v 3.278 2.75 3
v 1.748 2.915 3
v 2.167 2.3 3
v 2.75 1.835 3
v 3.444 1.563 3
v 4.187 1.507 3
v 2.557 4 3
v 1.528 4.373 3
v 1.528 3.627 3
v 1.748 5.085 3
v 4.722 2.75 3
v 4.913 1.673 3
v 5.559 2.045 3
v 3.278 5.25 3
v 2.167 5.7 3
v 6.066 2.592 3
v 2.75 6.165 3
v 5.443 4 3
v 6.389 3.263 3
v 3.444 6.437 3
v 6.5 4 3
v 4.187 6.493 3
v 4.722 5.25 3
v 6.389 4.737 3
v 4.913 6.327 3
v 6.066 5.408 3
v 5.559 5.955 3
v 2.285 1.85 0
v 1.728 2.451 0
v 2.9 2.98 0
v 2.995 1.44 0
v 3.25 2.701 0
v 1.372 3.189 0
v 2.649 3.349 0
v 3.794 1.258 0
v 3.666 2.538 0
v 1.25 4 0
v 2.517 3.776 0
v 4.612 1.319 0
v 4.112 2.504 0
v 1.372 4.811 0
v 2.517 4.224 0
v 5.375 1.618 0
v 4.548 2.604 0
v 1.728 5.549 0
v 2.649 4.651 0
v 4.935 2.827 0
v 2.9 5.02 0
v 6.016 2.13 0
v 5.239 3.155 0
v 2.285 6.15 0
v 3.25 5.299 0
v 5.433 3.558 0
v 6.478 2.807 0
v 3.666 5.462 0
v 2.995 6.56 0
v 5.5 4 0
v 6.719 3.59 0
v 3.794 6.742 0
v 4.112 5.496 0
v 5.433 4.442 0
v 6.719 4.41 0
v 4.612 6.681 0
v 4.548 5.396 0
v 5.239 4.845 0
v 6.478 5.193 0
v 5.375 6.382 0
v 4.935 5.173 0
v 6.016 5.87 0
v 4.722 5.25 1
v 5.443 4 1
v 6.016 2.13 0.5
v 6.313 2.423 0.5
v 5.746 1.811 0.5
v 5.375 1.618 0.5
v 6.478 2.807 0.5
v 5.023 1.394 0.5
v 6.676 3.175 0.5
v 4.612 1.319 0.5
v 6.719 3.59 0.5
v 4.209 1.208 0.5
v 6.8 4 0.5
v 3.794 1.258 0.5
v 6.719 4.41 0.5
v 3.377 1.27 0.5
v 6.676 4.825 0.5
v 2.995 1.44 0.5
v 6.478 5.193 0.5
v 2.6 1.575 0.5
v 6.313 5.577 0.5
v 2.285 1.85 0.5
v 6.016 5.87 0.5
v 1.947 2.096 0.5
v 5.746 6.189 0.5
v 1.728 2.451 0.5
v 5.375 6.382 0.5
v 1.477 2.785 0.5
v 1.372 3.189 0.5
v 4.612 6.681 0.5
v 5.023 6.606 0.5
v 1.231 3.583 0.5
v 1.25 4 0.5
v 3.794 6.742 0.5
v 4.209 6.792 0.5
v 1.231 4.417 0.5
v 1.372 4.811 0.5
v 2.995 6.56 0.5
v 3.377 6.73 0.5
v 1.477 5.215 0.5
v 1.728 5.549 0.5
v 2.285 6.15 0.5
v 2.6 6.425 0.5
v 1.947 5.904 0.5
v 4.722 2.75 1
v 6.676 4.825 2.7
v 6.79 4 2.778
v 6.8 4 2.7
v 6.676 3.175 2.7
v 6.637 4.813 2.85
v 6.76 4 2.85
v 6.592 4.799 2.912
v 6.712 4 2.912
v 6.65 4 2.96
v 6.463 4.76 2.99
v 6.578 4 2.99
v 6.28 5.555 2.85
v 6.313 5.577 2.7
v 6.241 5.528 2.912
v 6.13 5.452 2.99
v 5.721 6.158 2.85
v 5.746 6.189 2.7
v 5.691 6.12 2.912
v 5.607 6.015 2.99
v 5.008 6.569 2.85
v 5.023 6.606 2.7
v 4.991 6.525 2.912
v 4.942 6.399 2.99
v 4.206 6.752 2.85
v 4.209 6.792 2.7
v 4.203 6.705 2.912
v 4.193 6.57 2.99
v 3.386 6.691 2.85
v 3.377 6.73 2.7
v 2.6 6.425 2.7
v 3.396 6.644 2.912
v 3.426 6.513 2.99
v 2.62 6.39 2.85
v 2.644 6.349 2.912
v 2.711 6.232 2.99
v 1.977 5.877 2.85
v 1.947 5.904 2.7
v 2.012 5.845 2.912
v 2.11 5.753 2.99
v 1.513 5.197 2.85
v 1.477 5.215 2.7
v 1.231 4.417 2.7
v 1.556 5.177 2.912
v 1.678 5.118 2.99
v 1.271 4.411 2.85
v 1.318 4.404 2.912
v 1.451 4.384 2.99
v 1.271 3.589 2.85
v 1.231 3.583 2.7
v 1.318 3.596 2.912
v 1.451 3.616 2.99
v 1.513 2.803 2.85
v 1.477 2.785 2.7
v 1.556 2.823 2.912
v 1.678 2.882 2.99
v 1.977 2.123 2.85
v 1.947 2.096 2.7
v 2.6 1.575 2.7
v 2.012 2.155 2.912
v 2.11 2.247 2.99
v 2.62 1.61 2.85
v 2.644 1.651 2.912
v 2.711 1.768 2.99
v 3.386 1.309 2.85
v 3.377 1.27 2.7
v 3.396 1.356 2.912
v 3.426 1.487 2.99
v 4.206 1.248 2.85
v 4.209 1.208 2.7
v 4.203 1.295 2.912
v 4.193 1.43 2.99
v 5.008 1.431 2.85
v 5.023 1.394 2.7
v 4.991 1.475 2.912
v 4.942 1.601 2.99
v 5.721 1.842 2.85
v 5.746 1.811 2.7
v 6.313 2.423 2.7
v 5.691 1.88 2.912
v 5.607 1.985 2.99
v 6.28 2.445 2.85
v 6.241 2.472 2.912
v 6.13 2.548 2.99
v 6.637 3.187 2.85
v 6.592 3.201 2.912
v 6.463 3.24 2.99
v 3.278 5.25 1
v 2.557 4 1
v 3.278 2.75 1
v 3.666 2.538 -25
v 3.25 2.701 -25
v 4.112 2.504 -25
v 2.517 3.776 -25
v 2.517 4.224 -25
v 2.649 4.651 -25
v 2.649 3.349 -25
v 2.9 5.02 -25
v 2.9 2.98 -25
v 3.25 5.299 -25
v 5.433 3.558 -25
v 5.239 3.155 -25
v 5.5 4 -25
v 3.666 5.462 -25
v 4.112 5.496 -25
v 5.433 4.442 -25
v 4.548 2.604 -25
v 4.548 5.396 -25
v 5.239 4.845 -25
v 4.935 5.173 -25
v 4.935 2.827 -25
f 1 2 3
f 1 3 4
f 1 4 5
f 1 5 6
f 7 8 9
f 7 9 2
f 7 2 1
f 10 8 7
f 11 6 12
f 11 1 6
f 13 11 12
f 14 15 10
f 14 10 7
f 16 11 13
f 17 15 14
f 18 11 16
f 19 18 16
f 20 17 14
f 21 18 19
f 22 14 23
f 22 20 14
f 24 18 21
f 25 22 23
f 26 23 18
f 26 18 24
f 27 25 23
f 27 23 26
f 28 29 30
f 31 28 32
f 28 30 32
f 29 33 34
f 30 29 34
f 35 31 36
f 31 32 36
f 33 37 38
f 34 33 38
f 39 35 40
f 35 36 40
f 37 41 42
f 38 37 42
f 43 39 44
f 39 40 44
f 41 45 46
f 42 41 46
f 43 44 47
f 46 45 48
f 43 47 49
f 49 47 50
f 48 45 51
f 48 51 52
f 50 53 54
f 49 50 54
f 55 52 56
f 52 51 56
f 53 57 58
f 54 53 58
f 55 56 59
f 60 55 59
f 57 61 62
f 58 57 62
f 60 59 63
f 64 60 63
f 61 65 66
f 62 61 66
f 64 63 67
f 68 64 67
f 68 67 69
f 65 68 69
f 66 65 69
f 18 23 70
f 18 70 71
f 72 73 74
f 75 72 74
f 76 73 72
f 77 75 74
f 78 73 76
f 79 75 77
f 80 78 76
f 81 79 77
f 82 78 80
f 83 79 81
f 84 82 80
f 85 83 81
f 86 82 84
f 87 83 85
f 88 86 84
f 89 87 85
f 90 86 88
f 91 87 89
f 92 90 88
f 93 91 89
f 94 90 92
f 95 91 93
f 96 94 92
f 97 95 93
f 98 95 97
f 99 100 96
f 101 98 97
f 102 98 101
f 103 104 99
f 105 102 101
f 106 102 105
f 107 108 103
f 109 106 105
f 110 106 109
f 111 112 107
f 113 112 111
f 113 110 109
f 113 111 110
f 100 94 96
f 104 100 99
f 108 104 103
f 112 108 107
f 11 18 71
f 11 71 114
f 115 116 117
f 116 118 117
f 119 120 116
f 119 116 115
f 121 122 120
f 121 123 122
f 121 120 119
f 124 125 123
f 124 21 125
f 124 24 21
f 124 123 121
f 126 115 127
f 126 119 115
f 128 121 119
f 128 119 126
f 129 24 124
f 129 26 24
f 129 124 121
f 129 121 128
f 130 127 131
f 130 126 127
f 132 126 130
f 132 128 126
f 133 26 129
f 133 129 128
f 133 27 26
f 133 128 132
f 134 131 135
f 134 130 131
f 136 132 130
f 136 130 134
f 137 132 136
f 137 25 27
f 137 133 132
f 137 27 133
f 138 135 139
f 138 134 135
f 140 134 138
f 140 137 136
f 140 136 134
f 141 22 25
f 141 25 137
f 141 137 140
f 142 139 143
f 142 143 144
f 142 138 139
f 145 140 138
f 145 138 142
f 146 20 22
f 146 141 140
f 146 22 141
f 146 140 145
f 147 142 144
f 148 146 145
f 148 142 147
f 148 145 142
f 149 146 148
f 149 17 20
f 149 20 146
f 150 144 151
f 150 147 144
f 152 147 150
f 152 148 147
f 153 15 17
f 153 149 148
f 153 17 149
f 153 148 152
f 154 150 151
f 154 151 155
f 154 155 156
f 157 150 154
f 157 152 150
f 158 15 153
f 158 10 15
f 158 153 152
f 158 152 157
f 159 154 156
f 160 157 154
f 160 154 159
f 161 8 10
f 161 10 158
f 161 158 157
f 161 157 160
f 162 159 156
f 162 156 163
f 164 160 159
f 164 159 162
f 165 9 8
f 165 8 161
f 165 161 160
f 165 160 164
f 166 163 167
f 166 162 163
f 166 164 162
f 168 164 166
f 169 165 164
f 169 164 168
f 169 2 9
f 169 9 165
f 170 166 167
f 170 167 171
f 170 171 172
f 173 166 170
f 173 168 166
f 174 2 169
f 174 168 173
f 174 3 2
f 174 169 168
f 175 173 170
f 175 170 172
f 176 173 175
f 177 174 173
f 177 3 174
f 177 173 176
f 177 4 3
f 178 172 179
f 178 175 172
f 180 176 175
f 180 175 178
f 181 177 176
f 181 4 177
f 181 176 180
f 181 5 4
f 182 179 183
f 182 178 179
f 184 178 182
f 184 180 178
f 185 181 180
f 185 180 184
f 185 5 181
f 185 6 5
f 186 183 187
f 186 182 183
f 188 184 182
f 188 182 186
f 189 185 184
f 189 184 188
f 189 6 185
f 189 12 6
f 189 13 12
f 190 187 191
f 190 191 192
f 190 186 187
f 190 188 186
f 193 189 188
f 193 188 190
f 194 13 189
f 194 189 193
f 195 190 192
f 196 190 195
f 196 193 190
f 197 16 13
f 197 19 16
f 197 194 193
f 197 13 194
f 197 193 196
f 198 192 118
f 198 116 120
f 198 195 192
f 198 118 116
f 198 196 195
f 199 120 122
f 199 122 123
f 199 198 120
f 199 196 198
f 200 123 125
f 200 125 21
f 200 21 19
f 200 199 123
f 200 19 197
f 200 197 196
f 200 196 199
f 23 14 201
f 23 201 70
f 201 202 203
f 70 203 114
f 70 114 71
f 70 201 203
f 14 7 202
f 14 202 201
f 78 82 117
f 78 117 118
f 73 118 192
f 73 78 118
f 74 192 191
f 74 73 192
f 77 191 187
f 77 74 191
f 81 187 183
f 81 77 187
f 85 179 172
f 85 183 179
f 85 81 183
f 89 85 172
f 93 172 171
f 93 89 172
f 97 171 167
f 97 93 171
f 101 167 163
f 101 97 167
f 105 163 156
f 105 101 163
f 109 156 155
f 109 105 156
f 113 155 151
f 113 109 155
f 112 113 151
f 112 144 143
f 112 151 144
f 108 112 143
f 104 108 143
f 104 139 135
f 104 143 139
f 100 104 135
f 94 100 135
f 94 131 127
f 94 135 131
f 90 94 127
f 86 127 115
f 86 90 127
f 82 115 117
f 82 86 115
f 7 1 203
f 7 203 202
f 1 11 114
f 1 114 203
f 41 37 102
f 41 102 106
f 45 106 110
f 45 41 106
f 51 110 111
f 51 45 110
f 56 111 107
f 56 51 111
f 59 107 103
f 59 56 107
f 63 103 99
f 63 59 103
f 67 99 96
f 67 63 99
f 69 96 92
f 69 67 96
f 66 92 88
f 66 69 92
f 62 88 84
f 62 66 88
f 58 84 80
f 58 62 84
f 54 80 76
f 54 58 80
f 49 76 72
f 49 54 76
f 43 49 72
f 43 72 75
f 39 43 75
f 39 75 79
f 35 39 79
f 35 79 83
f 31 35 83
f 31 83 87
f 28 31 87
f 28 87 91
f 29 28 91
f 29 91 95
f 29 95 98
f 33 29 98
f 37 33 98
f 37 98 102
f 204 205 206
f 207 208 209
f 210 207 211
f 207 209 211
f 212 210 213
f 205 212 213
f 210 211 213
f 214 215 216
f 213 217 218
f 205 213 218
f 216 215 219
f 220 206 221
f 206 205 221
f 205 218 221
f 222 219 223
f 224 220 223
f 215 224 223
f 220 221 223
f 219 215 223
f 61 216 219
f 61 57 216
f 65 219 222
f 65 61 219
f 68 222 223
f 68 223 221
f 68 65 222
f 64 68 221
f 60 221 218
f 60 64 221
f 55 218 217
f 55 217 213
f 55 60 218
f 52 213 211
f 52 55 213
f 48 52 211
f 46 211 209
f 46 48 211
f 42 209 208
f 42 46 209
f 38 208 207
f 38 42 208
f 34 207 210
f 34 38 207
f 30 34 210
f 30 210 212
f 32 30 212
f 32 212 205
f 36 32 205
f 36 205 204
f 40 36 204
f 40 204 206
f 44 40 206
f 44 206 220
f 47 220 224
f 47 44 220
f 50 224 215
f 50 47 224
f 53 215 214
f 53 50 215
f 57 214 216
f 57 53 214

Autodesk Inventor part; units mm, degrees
ref_plane "YZ Plane" through (0, 0, 0) normal (1, 0, 0) x (0, 1, 0)
ref_plane "XZ Plane" through (0, 0, 0) normal (0, 1, 0) x (-1, 0, 0)
ref_plane "XY Plane" through (0, 0, 0) normal (0, 0, 1) x (1, 0, 0)
sketch "Sketch1" plane through (0, 0, 0) normal (0, 0, 1) x (1, 0, 0)
  circle A0 centre (4, 4) radius 1.2 projected
  circle A1 centre (4, 4) radius 1.5
  point P0 (0, 0)
  dimension "d0" = 3
extrude "Extrusion1" add sketch "Sketch1" against normal blind 25 contours A0 | A1
sketch "Sketch2" plane through (4, 4, 0) normal (0, 0, 1) x (1, 0, 0)
  circle A0 centre (0, 0) radius 1.5 projected
  circle A1 centre (0, 0) radius 2.8
  point P0 (-4, -4)
  dimension "d3" = 5.6
extrude "Extrusion2" add sketch "Sketch2" along normal blind 3 contours A0 | A1
fillet "Fillet1" radius 0.3 1 edges at (1.2, 4, 3)
sketch "Sketch3" plane through (4, 4, 0) normal (0, 0, -1) x (-1, 0, 0)
  circle A0 centre (0, 0) radius 2.8 projected
  circle A1 centre (0, 0) radius 1.5 projected
  circle A2 centre (0, 0) radius 2.75
  point P0 (4, -4)
  dimension "d7" = 5.5
extrude "Extrusion3" cut sketch "Sketch3" against normal blind 0.5 contours A0
sketch "Sketch4" plane through (4, 4, 3) normal (0, 0, 1) x (1, 0, 0)
  circle A0 centre (0, 0) radius 2.5 projected
  line L0 (0.7217, 1.25) -> (1.4434, 0)
  line L1 (1.4434, 0) -> (0.7217, -1.25)
  line L2 (0.7217, -1.25) -> (-0.7217, -1.25)
  line L3 (-0.7217, -1.25) -> (-1.4434, 0)
  line L4 (-1.4434, 0) -> (-0.7217, 1.25)
  line L5 (-0.7217, 1.25) -> (0.7217, 1.25)
  point P0 (-4, -4)
  dimension "d10" = 2.5
extrude "Extrusion4" cut sketch "Sketch4" against normal blind 2 contours L0 L1 L2 L3 L4 L5
thread "Thread1" size "M3x0.5" class "6g" standard "ANSI Metric M Profile" full length
properties part number "m3 6" material "Steel"
